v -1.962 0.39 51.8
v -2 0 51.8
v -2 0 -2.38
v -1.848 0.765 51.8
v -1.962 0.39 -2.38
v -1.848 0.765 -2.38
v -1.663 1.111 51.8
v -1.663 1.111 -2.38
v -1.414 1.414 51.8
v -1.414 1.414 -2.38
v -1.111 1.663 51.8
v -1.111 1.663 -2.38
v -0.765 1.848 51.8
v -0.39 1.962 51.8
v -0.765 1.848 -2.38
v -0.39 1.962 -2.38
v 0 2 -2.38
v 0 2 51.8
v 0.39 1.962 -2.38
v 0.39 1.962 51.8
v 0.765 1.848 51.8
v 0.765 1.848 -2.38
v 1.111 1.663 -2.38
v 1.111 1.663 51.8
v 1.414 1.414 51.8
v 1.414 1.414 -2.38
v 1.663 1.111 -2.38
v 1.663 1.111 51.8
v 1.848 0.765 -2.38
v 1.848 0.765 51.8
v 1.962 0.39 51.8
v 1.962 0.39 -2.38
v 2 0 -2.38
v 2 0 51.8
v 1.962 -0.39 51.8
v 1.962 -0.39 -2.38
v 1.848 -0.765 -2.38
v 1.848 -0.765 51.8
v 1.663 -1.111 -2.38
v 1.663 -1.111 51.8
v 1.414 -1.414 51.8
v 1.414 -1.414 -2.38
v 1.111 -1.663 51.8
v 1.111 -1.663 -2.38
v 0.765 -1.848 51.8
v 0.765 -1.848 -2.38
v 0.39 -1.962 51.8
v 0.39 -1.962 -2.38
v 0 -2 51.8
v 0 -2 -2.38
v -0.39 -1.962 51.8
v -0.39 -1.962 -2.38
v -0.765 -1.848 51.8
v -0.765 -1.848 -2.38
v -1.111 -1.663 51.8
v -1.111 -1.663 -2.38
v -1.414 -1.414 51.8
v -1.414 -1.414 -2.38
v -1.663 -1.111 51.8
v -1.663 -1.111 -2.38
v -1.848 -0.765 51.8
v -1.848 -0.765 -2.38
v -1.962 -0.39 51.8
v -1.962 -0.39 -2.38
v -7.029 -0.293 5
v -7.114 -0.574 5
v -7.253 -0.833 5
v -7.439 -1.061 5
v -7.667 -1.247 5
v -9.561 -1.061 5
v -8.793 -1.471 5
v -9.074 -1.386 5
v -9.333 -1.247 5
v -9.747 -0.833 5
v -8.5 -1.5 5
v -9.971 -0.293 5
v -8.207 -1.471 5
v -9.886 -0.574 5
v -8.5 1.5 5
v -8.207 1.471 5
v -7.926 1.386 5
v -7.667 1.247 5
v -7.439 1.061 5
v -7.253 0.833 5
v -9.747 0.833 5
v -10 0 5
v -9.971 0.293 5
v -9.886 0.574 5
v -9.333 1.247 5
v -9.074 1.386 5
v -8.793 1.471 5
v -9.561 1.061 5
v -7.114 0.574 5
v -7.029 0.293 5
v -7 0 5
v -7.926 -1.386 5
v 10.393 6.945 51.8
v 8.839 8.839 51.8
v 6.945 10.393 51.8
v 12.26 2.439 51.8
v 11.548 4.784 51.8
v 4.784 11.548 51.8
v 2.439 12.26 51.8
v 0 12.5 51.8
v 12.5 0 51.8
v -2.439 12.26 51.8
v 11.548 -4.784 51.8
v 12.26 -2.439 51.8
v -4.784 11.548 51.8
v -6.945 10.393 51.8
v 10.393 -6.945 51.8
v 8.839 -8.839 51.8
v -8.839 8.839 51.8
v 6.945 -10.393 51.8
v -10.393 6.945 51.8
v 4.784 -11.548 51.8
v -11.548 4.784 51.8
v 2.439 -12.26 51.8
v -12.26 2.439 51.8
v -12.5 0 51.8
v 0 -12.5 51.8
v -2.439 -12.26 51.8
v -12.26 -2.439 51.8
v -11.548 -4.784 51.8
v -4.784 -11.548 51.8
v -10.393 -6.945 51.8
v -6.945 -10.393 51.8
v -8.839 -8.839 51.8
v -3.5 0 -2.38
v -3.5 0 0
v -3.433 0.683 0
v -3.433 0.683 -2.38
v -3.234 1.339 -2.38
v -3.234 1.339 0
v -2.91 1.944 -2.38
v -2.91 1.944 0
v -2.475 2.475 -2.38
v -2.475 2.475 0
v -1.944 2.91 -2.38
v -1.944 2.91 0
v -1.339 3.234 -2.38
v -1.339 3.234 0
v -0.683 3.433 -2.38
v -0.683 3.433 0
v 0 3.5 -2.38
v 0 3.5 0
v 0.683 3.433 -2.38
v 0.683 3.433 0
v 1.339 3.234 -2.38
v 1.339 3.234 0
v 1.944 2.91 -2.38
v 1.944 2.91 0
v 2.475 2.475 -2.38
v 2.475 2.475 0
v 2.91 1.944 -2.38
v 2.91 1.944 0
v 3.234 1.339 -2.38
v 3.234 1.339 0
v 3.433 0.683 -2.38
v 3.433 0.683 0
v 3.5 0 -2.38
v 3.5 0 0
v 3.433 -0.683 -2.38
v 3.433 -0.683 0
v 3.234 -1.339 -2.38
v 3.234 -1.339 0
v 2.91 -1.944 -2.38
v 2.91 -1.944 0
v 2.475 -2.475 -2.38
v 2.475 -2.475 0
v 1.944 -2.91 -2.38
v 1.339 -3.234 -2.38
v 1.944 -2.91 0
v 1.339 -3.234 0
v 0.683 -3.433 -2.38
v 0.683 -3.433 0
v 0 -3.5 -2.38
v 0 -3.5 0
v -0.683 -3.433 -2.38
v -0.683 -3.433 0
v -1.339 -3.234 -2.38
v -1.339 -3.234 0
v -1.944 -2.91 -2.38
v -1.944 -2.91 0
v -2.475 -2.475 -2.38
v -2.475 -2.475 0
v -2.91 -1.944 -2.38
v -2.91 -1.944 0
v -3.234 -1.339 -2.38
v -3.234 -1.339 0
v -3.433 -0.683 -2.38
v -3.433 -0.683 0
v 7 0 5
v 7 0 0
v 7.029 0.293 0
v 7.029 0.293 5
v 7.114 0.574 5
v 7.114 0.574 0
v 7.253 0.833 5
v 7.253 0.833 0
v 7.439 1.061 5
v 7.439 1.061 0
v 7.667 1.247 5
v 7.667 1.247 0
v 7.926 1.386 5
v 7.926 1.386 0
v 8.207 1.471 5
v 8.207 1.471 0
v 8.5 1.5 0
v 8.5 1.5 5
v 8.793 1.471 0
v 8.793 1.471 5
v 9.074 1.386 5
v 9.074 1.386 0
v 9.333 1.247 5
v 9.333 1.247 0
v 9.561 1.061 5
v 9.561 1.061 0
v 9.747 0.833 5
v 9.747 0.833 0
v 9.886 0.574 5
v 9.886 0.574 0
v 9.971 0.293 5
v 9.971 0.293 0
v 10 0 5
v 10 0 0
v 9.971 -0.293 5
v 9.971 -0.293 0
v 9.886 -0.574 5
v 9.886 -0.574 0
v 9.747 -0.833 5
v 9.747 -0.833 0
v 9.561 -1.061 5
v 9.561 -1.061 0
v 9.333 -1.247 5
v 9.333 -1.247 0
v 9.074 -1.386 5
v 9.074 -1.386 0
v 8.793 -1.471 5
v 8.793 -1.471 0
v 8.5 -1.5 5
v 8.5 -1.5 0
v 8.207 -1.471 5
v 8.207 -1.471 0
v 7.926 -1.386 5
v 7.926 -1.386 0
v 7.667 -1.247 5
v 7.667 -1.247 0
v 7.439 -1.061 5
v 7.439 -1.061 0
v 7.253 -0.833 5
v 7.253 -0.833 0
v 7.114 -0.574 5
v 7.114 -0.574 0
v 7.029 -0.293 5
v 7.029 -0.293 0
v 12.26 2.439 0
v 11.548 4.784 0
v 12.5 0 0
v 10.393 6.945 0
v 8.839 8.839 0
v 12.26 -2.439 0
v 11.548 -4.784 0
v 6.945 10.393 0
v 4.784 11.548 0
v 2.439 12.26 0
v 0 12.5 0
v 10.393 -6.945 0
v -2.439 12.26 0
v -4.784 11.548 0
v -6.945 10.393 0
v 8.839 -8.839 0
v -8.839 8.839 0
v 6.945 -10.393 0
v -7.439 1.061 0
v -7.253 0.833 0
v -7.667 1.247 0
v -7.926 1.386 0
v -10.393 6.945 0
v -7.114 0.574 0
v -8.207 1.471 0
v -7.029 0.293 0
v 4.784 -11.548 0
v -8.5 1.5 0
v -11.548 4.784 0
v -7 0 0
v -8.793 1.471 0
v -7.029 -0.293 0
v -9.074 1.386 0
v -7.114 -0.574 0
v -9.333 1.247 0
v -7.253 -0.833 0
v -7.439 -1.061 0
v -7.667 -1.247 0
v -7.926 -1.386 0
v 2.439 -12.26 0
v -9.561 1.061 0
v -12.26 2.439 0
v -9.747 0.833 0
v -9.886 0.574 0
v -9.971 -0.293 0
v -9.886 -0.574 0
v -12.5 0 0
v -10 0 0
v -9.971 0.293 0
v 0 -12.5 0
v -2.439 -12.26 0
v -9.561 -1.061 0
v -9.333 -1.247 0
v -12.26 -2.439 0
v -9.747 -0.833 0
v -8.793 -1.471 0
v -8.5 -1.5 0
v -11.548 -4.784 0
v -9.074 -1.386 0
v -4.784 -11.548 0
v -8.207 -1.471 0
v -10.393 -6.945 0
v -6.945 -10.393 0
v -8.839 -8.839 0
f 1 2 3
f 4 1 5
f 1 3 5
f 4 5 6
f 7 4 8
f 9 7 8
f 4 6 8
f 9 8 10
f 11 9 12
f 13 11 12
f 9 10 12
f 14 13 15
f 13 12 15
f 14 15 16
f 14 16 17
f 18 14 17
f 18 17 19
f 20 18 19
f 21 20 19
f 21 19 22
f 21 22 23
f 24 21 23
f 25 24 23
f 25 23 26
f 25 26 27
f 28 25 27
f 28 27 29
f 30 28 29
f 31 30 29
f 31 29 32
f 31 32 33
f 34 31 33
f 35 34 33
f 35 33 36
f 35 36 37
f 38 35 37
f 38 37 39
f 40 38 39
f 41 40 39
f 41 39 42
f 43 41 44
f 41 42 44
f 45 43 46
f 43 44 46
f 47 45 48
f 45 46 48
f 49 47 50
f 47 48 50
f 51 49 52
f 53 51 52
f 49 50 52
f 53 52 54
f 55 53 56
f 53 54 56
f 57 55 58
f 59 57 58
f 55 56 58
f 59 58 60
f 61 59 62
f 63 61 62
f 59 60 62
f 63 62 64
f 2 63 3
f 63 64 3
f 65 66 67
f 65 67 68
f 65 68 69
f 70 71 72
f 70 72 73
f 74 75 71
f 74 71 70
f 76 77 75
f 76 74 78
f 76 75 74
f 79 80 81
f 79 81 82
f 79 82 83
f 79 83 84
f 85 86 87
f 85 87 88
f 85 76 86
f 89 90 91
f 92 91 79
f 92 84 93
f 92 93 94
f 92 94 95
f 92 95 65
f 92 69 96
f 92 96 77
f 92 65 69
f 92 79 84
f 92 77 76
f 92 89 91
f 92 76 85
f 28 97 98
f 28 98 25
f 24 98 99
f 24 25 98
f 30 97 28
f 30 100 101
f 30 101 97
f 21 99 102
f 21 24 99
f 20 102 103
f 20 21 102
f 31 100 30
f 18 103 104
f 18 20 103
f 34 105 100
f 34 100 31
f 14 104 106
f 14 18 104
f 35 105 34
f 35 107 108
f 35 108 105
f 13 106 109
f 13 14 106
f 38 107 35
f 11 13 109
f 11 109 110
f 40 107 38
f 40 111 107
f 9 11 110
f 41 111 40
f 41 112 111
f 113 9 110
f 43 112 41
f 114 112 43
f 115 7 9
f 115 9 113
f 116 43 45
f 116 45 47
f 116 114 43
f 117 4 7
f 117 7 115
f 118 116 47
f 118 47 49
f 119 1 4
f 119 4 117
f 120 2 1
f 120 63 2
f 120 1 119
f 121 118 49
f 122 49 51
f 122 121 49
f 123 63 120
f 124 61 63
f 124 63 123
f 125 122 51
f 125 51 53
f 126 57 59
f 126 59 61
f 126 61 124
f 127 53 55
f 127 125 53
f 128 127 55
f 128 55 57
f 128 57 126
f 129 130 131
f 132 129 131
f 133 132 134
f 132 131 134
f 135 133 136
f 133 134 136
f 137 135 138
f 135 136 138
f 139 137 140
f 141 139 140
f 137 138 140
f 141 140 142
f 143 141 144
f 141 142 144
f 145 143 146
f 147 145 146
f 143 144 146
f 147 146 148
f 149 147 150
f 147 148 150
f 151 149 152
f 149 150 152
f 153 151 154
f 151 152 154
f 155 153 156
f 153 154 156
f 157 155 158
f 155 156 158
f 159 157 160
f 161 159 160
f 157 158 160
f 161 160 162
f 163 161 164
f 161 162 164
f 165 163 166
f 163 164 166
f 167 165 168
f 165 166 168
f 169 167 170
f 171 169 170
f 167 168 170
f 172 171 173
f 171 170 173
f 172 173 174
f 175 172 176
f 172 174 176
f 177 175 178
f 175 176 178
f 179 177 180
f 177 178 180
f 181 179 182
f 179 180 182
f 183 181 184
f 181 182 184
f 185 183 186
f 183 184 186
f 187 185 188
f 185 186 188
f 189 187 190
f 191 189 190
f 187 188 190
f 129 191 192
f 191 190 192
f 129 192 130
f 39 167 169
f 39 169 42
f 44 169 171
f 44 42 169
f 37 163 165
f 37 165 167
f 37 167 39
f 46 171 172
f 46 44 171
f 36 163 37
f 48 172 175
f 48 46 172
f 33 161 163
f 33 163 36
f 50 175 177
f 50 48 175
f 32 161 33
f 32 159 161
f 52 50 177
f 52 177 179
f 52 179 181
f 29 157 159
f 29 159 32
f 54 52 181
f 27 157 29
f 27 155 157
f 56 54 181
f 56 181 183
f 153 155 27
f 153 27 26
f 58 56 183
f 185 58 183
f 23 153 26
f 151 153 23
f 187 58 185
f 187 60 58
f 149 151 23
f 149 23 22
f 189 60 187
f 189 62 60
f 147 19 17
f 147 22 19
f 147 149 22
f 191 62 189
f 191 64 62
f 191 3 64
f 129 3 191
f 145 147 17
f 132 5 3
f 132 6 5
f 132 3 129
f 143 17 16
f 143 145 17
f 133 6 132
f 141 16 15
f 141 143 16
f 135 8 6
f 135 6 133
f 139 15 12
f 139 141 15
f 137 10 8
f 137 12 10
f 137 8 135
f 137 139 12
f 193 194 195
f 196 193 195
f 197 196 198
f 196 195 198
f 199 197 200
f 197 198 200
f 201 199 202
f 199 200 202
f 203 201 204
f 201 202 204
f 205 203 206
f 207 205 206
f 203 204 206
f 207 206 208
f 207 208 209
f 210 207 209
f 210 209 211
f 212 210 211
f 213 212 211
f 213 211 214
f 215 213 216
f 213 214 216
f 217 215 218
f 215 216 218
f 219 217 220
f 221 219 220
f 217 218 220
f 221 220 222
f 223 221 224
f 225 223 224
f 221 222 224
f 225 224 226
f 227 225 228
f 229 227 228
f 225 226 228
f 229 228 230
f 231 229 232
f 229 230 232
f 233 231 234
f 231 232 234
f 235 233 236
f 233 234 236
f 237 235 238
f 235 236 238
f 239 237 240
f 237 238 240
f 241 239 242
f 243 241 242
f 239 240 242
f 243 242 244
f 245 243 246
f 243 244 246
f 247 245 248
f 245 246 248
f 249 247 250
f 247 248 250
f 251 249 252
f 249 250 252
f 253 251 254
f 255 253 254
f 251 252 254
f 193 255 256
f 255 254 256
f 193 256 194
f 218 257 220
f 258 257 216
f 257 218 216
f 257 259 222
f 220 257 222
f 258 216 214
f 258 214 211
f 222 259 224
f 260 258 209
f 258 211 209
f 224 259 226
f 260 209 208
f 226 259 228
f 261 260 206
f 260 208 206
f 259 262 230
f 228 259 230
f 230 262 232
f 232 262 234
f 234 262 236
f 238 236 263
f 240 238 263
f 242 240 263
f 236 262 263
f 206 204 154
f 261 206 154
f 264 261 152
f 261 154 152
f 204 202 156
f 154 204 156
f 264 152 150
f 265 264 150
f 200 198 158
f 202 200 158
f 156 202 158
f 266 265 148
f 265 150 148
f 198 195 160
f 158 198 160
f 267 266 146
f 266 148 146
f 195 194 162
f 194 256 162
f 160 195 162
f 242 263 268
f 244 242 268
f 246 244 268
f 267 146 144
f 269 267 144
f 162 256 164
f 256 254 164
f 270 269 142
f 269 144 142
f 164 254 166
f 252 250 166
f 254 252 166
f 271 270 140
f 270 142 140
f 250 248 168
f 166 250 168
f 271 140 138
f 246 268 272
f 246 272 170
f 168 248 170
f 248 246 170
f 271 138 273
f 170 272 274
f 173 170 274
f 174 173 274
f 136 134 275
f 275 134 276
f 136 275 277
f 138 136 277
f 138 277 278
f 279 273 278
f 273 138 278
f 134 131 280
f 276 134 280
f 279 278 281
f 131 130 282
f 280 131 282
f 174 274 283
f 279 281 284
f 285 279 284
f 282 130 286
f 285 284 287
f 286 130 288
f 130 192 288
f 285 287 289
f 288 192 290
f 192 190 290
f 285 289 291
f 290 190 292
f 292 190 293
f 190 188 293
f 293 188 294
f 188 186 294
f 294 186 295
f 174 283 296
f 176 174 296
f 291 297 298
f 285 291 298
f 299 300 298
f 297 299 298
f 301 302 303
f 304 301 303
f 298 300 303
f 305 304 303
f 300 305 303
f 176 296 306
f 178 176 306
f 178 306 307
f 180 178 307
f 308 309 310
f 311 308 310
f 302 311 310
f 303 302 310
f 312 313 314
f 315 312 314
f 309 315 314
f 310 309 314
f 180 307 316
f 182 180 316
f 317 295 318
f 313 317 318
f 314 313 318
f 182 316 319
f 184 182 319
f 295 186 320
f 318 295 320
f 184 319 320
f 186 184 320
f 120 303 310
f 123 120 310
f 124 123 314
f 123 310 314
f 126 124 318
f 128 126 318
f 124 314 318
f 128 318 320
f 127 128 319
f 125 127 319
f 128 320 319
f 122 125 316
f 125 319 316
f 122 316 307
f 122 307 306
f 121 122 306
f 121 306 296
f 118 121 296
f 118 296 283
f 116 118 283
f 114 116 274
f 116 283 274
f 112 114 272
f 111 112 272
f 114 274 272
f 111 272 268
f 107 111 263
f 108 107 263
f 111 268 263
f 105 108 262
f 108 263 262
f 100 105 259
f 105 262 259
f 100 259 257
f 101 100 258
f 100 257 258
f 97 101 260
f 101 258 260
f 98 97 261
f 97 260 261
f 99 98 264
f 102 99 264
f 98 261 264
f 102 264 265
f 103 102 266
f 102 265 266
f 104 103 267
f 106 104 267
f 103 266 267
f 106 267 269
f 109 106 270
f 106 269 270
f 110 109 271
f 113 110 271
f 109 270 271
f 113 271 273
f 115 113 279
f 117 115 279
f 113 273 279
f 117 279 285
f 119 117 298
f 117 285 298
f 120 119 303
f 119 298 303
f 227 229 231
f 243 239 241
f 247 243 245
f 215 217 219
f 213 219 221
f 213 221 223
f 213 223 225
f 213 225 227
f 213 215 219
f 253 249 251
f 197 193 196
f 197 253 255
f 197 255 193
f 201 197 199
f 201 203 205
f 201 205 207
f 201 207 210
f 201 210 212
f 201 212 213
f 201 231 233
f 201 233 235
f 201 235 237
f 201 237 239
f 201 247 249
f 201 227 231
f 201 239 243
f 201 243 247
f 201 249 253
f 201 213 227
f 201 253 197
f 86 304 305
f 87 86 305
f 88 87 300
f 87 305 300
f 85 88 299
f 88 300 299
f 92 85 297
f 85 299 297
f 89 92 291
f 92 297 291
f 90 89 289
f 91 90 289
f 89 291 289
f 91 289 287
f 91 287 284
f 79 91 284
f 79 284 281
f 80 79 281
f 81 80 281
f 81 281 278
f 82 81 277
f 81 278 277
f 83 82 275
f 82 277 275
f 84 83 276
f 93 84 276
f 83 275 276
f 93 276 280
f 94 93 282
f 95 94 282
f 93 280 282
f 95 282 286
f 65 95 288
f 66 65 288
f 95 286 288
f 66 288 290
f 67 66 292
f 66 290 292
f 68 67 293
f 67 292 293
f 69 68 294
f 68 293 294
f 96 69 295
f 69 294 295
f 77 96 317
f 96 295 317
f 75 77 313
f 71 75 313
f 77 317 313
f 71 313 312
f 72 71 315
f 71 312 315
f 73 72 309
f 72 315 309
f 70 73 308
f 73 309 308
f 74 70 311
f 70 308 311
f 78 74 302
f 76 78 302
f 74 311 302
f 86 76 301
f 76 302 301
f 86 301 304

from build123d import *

# Parameters (mm, degrees)
SKETCH1_R           = 12.5
BOSS_EXTRUDE1_DEPTH = 51.8
SKETCH2_R           = 3.5
BOSS_EXTRUDE2_DEPTH = 2.38
SKETCH3_R           = 1.5
CUT_EXTRUDE1_DEPTH  = 5
SKETCH4_R           = 2
CUT_EXTRUDE2_DEPTH  = 57.990985252


with BuildPart() as part:
    # Sketch1 → Boss-Extrude1 (new body)
    with BuildSketch(Plane.XY):
        with Locations(Location((0, 0, 0), (0, 0, 180))):
            Circle(SKETCH1_R)
    extrude(amount=BOSS_EXTRUDE1_DEPTH)

    # Sketch2 → Boss-Extrude2 (add)
    with BuildSketch(Plane(origin=(0, 0, 0), x_dir=(-1, 0, 0), z_dir=(0, 0, -1))):
        Circle(SKETCH2_R)
    extrude(amount=BOSS_EXTRUDE2_DEPTH)

    # Sketch3 → Cut-Extrude1 (cut)
    with BuildSketch(Plane(origin=(0, 0, 0), x_dir=(-1, 0, 0), z_dir=(0, 0, -1))):
        with Locations((8.5, 0)):
            Circle(SKETCH3_R)
        with Locations((-8.5, 0)):
            Circle(SKETCH3_R)
    extrude(amount=-CUT_EXTRUDE1_DEPTH, mode=Mode.SUBTRACT)

    # Sketch4 → Cut-Extrude2 (cut, through all)
    with BuildSketch(Plane(origin=(0, 0, -2.38), x_dir=(-1, 0, 0), z_dir=(0, 0, -1))):
        Circle(SKETCH4_R)
    extrude(amount=-CUT_EXTRUDE2_DEPTH, mode=Mode.SUBTRACT)


solid = part.part
